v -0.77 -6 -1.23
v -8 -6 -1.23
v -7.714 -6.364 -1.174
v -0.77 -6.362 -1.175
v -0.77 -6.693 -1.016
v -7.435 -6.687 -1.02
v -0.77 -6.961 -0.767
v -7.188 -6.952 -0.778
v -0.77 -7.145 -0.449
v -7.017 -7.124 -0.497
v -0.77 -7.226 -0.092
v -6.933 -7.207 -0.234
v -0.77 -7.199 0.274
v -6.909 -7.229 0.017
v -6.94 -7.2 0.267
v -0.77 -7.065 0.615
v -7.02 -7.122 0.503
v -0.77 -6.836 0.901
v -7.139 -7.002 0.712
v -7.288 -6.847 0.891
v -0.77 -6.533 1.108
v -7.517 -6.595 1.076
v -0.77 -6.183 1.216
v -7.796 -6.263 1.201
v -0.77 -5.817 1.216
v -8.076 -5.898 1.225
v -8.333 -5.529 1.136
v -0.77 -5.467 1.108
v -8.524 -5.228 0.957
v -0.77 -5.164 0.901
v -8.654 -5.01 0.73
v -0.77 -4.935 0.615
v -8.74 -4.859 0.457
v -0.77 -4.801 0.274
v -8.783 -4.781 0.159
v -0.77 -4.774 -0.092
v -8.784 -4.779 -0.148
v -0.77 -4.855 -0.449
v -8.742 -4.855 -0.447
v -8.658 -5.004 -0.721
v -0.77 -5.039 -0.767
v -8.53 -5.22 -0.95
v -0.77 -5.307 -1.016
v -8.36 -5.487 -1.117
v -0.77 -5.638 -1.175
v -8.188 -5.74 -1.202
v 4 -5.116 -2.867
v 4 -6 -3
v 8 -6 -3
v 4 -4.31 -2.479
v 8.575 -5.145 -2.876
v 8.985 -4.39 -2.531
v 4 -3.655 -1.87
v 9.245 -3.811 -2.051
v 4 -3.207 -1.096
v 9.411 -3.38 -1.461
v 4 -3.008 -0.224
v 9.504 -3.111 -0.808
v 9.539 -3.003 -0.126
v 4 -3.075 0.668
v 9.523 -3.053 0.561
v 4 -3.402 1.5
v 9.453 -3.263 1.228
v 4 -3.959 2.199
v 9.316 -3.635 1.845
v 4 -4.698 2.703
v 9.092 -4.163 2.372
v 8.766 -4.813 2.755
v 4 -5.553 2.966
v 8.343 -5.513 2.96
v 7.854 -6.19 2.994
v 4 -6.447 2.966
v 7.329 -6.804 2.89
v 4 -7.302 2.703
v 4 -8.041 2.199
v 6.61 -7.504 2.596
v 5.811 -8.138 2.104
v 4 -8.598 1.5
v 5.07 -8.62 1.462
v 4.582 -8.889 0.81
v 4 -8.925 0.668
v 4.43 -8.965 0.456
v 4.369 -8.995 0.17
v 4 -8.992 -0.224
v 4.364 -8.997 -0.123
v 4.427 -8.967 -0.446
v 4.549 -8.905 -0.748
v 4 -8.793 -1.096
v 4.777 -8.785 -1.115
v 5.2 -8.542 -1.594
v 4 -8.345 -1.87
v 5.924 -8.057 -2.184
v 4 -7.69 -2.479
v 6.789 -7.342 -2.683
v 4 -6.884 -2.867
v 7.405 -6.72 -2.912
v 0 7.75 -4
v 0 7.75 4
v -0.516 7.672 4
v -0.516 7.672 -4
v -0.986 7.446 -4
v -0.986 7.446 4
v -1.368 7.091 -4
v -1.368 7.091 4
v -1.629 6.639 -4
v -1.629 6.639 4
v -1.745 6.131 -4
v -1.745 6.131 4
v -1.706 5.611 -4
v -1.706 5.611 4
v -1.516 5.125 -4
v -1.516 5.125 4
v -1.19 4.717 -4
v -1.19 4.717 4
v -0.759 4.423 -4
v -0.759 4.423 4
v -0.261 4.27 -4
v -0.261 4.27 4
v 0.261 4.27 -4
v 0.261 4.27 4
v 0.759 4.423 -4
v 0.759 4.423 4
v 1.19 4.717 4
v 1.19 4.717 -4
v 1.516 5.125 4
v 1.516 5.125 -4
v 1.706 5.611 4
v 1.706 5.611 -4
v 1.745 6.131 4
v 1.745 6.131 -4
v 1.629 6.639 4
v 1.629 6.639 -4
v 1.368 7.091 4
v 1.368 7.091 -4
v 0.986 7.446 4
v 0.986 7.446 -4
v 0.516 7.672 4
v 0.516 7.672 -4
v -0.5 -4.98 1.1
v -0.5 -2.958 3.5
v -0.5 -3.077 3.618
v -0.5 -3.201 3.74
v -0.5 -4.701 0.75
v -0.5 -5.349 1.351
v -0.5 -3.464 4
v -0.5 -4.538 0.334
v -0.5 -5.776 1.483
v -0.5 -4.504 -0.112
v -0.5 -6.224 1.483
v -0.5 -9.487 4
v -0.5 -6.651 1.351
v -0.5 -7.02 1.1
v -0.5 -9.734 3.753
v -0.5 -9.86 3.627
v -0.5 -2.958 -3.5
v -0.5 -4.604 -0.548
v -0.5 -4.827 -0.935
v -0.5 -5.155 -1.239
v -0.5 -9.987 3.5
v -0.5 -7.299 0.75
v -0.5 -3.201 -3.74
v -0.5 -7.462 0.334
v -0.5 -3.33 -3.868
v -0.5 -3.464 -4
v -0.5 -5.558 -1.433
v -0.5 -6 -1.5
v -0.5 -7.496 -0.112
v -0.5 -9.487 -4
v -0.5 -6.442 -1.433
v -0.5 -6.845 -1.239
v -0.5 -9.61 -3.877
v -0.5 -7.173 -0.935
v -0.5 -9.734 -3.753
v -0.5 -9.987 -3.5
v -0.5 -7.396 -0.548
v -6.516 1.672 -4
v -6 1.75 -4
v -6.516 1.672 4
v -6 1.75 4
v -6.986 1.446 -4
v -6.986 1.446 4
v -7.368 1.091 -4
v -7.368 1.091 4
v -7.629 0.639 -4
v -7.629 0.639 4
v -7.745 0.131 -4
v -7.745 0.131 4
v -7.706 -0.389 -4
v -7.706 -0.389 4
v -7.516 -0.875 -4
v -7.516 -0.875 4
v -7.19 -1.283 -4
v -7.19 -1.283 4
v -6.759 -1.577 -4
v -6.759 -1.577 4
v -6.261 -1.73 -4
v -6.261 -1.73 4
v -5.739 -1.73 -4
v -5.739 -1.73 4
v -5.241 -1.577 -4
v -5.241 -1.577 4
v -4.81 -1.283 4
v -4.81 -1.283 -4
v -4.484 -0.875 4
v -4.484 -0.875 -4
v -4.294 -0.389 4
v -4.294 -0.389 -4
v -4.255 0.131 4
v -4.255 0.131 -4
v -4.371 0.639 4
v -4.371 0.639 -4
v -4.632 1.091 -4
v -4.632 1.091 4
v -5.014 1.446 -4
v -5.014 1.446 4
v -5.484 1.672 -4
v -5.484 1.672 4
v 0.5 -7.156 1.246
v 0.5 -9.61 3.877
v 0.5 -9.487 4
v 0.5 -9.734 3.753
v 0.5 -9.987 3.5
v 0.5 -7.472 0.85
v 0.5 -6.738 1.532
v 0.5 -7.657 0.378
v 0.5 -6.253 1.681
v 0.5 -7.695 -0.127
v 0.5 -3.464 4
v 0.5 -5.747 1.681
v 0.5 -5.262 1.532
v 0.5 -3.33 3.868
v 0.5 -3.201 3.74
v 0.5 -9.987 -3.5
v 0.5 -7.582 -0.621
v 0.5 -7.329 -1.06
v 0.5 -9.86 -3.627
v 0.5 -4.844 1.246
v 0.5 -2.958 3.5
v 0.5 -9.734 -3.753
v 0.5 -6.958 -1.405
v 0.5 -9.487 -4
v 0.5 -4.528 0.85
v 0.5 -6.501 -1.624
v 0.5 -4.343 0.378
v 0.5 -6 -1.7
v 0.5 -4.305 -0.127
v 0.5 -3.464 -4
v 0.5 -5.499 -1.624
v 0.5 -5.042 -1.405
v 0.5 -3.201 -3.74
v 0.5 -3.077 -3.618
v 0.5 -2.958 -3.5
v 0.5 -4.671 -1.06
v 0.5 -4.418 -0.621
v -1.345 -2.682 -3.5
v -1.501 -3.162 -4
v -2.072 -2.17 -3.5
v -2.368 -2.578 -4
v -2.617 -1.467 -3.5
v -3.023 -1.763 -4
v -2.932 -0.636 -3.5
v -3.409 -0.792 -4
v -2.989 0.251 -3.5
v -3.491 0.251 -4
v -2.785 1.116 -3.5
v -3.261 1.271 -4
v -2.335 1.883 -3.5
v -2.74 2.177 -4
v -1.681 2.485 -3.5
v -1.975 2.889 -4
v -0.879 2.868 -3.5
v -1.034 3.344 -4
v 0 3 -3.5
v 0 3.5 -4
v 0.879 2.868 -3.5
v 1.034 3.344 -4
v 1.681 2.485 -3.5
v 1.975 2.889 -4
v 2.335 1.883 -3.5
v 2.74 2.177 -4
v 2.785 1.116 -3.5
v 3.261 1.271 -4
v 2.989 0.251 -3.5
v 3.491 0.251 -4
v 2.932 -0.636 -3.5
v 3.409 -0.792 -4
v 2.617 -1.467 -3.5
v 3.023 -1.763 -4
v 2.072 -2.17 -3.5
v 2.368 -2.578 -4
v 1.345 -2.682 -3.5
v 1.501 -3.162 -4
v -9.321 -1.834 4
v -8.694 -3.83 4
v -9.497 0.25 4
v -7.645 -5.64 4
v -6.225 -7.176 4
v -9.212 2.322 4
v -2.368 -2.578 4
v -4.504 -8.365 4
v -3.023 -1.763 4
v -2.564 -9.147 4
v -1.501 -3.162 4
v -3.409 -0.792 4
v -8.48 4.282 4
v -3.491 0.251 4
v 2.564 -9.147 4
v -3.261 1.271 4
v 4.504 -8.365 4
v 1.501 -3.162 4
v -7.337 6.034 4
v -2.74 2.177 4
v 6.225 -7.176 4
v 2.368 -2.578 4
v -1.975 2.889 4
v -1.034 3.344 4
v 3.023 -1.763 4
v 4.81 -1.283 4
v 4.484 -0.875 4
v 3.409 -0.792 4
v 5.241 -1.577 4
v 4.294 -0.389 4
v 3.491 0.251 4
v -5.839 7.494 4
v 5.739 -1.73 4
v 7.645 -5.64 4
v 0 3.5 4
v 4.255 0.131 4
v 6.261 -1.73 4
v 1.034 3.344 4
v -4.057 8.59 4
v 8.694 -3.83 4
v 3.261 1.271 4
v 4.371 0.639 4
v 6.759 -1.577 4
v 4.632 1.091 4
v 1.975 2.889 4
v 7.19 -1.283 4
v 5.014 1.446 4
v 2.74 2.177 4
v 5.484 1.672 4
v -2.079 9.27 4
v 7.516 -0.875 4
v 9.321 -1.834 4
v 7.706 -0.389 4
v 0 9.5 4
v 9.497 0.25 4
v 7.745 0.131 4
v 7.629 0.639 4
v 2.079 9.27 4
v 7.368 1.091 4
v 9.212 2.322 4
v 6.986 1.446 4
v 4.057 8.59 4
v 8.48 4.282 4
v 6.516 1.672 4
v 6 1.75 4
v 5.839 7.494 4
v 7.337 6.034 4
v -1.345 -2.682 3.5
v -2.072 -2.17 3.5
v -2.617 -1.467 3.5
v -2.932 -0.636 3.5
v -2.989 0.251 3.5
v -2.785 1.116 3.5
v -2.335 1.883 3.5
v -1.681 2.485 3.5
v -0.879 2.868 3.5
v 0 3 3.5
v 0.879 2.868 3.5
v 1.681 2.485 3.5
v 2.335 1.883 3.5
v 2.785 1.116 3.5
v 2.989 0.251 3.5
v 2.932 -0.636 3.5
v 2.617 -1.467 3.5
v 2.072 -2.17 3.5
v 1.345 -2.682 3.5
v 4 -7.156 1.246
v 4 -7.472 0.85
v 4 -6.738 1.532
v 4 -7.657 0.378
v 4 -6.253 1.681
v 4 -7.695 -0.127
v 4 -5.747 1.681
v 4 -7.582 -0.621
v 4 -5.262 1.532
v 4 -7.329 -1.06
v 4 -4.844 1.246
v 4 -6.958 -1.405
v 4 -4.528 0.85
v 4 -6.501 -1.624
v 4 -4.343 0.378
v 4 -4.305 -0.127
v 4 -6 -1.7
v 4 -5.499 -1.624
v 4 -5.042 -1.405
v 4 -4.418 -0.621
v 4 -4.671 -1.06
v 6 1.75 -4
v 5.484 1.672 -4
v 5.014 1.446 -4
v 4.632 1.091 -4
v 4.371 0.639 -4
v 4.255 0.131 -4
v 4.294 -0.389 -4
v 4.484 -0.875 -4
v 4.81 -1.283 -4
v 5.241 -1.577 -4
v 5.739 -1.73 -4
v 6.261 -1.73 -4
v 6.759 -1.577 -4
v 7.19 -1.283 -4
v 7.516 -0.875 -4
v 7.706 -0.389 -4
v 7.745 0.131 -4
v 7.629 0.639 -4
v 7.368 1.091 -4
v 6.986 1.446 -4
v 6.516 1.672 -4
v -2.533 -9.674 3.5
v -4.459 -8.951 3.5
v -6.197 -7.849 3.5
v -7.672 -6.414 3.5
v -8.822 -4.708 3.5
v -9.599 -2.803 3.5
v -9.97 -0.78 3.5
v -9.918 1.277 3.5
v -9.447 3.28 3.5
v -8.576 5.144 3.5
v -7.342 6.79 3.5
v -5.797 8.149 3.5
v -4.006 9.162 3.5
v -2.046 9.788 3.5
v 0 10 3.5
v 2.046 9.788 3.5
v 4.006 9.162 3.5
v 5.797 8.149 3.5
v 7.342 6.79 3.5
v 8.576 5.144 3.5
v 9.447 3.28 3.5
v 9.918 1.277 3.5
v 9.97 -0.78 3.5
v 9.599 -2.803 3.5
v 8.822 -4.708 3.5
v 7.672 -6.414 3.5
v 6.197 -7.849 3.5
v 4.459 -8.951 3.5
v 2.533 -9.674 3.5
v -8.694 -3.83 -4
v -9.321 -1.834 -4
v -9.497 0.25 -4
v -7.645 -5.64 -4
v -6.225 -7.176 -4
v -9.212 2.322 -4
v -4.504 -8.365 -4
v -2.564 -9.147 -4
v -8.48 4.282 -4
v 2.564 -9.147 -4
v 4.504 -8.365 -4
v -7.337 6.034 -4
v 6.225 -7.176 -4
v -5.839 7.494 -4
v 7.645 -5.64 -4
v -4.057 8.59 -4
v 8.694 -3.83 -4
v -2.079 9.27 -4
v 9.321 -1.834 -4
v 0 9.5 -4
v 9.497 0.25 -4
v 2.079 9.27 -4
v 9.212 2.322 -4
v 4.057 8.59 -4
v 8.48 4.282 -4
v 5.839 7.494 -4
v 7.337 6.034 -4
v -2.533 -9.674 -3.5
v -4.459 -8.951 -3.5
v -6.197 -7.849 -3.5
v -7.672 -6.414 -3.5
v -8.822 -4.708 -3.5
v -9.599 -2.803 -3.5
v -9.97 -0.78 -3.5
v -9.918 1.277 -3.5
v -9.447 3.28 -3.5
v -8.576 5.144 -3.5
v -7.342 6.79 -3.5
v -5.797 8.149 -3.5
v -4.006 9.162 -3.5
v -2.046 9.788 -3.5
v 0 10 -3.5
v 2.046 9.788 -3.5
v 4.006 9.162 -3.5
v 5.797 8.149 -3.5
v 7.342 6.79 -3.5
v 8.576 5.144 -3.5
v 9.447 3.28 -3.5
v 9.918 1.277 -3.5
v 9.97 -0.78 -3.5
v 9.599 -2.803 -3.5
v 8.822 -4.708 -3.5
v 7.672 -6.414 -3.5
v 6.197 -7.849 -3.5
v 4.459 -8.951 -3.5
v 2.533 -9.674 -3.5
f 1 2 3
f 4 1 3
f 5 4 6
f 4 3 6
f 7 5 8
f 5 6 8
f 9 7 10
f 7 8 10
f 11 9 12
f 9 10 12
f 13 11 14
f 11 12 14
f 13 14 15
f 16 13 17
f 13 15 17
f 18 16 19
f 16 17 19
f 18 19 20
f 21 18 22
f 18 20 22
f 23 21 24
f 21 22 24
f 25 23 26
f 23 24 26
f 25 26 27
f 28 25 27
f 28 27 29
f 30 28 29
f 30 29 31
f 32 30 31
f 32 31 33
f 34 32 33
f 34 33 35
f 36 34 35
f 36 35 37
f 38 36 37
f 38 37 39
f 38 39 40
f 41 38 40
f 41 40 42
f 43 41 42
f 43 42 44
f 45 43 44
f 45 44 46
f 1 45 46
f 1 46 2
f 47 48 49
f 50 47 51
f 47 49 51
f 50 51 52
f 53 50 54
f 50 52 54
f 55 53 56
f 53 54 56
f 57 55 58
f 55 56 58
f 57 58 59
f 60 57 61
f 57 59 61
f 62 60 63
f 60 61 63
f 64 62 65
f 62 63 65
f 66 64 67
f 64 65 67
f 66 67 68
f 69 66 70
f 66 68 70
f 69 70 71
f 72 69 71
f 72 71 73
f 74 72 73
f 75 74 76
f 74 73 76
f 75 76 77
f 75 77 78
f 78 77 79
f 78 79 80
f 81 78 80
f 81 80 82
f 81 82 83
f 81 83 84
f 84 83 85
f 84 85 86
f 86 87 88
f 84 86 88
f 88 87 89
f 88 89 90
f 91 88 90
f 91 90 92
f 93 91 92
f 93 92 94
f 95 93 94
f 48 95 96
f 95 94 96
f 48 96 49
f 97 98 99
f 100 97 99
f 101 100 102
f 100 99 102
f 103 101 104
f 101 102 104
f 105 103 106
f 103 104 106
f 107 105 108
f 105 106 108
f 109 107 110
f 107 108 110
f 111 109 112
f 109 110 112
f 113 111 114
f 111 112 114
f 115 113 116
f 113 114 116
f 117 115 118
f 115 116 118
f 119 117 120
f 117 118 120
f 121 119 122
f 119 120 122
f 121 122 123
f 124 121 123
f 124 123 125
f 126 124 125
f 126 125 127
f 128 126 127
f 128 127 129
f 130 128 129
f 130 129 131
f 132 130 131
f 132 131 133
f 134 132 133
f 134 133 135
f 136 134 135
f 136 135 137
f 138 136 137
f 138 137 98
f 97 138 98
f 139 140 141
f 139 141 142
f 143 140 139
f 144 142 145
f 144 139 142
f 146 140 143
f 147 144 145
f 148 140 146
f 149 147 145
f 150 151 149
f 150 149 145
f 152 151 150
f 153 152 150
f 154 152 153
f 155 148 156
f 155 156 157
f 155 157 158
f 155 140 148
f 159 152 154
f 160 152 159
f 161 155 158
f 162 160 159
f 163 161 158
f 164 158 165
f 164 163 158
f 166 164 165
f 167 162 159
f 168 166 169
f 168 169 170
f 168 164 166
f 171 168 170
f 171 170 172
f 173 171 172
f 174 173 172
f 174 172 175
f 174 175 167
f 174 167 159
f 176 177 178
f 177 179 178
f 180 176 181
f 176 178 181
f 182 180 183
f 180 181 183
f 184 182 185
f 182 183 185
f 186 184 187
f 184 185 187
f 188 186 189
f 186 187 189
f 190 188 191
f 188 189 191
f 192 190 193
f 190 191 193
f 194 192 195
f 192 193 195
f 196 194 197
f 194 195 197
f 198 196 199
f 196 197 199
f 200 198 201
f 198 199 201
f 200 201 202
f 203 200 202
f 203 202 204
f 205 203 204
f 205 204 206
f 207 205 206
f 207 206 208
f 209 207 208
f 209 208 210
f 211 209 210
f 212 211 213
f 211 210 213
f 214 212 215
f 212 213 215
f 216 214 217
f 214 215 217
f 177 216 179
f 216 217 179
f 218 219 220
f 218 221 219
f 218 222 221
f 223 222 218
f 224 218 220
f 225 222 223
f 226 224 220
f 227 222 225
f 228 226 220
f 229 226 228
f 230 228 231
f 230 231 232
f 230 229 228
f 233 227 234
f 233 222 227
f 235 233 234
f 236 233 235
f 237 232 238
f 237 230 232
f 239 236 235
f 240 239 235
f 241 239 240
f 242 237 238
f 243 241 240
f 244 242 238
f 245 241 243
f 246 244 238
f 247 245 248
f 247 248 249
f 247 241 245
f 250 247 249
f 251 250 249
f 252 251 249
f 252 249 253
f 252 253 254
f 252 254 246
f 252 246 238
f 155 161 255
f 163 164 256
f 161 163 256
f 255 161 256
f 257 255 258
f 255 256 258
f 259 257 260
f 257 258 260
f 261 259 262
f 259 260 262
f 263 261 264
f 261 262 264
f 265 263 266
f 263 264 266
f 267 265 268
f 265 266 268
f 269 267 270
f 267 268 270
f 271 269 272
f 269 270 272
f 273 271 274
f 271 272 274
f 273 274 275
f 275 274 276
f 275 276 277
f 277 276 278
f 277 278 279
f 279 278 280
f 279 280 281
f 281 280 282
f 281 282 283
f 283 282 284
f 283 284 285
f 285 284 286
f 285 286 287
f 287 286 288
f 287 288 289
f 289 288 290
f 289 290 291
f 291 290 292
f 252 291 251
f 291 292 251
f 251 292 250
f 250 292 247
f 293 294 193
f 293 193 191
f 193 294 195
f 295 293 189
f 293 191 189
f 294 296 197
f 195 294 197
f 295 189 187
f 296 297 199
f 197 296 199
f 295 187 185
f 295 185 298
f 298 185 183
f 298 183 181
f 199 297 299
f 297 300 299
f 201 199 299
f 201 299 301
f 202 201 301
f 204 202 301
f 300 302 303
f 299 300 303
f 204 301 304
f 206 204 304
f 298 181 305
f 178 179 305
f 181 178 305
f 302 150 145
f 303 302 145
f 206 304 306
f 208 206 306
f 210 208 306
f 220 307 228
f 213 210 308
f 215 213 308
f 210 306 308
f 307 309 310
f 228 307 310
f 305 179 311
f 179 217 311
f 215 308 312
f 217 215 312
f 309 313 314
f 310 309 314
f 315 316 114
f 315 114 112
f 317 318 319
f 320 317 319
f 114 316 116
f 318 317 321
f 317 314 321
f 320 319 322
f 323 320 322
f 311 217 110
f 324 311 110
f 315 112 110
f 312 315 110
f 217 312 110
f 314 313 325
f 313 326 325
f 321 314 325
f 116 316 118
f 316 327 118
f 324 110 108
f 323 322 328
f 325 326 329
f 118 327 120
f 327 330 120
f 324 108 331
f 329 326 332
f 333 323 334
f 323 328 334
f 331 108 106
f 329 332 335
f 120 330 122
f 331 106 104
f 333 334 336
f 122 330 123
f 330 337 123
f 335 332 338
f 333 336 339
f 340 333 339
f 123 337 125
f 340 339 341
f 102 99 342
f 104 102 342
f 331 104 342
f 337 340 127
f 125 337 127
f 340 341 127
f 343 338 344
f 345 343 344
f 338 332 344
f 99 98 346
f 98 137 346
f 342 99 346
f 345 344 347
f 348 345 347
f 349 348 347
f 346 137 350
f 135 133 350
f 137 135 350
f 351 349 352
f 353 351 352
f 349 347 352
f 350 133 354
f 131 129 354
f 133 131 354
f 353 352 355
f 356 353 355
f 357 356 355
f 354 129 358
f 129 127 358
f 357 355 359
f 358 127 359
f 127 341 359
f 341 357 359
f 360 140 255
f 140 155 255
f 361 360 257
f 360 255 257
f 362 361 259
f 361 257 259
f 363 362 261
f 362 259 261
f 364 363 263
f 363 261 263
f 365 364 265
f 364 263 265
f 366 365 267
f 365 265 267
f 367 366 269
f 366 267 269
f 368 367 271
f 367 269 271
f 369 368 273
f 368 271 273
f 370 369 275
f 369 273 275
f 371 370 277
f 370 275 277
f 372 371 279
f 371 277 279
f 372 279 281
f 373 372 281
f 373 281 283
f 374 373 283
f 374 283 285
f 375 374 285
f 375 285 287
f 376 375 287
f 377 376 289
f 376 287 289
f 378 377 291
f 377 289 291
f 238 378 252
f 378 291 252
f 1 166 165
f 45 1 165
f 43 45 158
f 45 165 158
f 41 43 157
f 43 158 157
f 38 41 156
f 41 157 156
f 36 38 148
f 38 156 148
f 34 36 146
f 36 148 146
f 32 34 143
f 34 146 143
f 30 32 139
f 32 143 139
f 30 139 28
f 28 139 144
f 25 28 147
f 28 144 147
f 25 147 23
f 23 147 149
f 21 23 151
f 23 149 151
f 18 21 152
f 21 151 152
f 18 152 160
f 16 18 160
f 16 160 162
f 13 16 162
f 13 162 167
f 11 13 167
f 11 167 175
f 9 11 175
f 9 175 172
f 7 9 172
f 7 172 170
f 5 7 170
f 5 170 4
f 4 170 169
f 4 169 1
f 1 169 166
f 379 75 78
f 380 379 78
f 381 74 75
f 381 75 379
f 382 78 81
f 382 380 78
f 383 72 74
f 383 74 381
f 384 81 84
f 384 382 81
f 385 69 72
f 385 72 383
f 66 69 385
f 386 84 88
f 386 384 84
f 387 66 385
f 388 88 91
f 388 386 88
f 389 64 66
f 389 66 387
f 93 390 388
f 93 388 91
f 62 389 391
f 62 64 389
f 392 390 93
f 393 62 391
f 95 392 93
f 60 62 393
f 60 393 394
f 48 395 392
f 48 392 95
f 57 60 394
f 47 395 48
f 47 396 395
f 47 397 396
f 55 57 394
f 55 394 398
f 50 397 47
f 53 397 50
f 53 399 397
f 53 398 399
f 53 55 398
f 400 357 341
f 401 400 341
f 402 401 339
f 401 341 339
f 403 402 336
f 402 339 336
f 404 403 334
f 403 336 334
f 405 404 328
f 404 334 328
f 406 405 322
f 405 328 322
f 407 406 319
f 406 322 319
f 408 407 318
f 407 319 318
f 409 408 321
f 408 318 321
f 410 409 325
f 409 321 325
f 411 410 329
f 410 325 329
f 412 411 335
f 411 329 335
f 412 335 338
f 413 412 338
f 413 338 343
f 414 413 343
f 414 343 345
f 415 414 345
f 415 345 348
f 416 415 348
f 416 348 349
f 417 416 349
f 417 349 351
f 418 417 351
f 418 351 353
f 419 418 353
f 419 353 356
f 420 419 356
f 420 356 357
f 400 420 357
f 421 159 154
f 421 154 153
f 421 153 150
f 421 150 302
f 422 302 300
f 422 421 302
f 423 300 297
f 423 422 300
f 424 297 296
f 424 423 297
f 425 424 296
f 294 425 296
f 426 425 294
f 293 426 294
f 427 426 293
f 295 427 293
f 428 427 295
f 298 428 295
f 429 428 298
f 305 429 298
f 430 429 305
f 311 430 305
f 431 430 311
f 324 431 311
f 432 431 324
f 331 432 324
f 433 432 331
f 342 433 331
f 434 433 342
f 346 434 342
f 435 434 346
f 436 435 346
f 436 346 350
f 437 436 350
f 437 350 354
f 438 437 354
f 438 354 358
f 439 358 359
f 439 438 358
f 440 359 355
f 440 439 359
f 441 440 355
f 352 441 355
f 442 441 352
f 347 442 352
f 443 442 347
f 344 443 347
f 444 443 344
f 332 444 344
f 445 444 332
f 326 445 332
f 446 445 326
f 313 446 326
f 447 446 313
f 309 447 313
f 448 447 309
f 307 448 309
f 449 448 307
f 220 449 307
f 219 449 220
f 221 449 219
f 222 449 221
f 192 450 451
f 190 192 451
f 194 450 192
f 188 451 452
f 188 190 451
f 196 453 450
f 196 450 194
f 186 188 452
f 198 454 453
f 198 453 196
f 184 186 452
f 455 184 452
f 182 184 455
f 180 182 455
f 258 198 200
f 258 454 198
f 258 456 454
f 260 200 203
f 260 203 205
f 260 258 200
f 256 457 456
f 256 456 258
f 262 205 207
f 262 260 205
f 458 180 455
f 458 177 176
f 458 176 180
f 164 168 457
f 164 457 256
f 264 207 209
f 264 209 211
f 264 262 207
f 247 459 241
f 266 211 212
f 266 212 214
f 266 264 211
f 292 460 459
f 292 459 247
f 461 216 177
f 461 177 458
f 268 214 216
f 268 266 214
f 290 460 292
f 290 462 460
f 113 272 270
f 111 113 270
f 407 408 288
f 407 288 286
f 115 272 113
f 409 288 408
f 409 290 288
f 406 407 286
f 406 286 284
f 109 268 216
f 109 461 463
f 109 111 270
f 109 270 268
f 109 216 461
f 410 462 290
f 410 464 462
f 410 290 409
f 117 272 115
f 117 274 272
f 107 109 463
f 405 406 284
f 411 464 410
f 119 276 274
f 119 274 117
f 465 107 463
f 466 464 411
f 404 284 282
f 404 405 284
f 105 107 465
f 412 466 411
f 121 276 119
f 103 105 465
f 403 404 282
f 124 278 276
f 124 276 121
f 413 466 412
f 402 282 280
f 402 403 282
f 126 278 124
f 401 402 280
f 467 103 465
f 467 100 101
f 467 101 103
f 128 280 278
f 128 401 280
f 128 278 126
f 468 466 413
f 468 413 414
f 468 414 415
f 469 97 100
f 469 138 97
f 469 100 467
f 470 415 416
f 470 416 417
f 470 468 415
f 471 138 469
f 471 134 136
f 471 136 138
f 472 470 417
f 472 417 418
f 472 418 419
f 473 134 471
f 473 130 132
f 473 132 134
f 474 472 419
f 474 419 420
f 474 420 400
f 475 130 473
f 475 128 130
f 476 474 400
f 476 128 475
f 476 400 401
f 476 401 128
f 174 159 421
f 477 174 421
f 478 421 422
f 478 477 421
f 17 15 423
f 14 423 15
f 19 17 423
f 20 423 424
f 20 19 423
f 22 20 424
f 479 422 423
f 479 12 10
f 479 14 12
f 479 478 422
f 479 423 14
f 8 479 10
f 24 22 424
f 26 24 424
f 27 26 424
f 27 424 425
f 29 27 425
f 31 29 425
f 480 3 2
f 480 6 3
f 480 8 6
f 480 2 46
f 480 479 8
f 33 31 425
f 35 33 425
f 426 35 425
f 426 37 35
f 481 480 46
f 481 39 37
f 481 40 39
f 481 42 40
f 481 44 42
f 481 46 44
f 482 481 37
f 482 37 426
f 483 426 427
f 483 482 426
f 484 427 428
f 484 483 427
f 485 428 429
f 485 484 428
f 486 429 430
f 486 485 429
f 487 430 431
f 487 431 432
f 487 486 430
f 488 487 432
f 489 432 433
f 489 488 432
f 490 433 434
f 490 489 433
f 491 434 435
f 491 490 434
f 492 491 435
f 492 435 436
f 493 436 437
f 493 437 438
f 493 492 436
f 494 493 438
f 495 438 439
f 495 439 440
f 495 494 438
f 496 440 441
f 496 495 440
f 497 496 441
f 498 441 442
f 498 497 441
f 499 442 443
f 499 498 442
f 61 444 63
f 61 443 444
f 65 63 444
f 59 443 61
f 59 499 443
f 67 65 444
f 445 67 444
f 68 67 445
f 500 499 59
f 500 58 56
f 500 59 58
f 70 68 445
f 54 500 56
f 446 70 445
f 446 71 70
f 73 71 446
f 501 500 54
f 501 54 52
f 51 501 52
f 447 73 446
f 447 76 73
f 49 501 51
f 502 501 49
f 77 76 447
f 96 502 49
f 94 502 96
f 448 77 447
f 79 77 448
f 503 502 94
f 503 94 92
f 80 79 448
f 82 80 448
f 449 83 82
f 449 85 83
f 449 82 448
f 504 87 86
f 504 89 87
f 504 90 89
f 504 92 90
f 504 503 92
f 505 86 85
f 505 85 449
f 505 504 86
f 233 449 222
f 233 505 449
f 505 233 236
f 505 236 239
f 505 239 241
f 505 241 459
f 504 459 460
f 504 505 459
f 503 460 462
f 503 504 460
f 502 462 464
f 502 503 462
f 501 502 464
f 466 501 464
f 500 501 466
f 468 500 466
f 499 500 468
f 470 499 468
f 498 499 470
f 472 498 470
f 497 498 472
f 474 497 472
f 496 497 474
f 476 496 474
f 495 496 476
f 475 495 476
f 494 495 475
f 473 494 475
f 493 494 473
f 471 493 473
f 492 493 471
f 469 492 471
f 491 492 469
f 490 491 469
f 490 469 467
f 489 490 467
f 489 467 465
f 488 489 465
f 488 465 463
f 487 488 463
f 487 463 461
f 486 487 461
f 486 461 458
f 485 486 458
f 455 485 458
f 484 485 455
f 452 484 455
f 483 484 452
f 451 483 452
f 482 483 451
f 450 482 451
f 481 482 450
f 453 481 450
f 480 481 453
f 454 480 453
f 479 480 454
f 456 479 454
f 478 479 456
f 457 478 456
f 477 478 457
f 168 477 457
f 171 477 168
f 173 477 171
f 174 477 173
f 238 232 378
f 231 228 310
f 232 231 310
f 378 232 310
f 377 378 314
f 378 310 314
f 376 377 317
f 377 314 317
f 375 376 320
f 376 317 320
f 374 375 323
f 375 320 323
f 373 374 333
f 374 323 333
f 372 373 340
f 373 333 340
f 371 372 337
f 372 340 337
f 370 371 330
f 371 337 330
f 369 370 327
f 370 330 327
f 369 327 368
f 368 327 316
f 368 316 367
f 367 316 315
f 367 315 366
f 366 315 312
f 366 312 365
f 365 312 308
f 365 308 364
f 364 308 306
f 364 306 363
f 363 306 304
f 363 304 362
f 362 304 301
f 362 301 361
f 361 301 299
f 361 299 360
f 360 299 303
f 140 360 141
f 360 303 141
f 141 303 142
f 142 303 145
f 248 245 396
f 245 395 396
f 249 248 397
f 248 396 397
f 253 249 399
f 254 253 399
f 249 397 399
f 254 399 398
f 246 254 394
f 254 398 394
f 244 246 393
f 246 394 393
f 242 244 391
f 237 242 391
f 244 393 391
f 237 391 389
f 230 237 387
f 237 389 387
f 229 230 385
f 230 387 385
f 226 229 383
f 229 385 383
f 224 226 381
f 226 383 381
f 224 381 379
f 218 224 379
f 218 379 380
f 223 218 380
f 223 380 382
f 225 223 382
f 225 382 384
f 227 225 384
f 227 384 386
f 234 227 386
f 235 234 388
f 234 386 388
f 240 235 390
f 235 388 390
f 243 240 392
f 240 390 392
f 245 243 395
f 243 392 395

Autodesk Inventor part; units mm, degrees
sketch "Sketch_14" plane through (0, 0, 0) normal (1, 0, 0) x (0, 1, 0)
  line L0 (0, -4) -> (0, 4)
  line L1 (0, 4) -> (9.5, 4)
  line L2 (9.5, 4) -> (10, 3.5)
  line L3 (10, 3.5) -> (10, -3.5)
  line L4 (10, -3.5) -> (9.5, -4)
  line L5 (9.5, -4) -> (0, -4)
  line L6 (0, -4) -> (0, 4)
revolve "Revolution1" add sketch "Sketch_14" angle 360 about axis through (0, 0, -4) along (0, 0, -1)
sketch "Sketch_15" plane through (0, 0, 0) normal (1, 0, 0) x (0, 1, 0)
  line L0 (0, -4) -> (0, 4)
  line L1 (0, 4) -> (3.5, 4)
  line L2 (3.5, 4) -> (3, 3.5)
  line L3 (3, 3.5) -> (3, -3.5)
  line L4 (3, -3.5) -> (3.5, -4)
  line L5 (3.5, -4) -> (0, -4)
  line L6 (0, -4) -> (0, 4)
revolve "Revolution2" cut sketch "Sketch_15" angle 360 about axis through (0, 0, -4) along (0, 0, -1)
sketch "Sketch_16" plane through (0, 0, 0) normal (0, 0, 1) x (1, 0, 0)
  arc A0 (-0.5, -10.9886) -> (0.5, -10.9886) centre (0, 0) ccw
  line L0 (0.5, -10.9886) -> (0.5, 0)
  line L1 (0.5, 0) -> (-0.5, 0)
  line L2 (-0.5, 0) -> (-0.5, -10.9886)
extrude "Extrusion1" cut sketch "Sketch_16" along normal mid plane 8
sketch "Sketch4" plane through (0, 0, -4) normal (0, 0, -1) x (-1, 0, 0)
  point P0 (-6, 0)
hole "Hole1" at (6, 0, -4) direction (0, 0, 1) diameter 3.5 depth 8
sketch "Sketch5" plane through (0, 0, -4) normal (0, 0, -1) x (-1, 0, 0)
  point P0 (6, 0)
hole "Hole2" at (-6, 0, -4) direction (0, 0, 1) diameter 3.5 depth 8
sketch "Sketch6" plane through (0, 0, -4) normal (0, 0, -1) x (-1, 0, 0)
  point P0 (0, 6)
hole "Hole3" at (0, 6, -4) direction (0, 0, 1) diameter 3.5 depth 8
sketch "Sketch_23" plane through (0, -6, 0) normal (0, 1, 0) x (1, 0, 0)
  line L0 (10, 0) -> (0, 0)
  line L1 (0, 0) -> (0, 1.7)
  line L2 (0, 1.7) -> (4, 1.7)
  line L3 (4, 1.7) -> (4, 3)
  line L4 (4, 3) -> (10, 3)
  line L5 (10, 3) -> (10, 0)
  line L6 (10, 0) -> (0, 0)
revolve "Revolution3" cut sketch "Sketch_23" angle 360 about axis through (10, -6, 0) along (1, 0, 0)
sketch "Sketch8" plane through (-0.5, -9.4868, 4) normal (1, 0, 0) x (0, 0, -1)
  point P0 (4, 3.4868)
hole "Hole4" at (-0.5, -6, 0) direction (-1, 0, 0) diameter 2.459 depth 8.4303 countersink diameter 3 countersink angle 90 thread size "M3x0.5" class "6H" standard "ISO Metric profile"
ref_plane "to_bolt_XY" through (4, -6, 0) normal (1, 0, 0) x (0, 0, -1)
ref_plane "to_bolt_YZ" through (4, -6, 0) normal (0, 0, -1) x (0, 1, 0)
ref_plane "to_bolt_ZX" through (4, -6, 0) normal (0, 1, 0) x (1, 0, 0)
properties part number "SCST6-8b"
